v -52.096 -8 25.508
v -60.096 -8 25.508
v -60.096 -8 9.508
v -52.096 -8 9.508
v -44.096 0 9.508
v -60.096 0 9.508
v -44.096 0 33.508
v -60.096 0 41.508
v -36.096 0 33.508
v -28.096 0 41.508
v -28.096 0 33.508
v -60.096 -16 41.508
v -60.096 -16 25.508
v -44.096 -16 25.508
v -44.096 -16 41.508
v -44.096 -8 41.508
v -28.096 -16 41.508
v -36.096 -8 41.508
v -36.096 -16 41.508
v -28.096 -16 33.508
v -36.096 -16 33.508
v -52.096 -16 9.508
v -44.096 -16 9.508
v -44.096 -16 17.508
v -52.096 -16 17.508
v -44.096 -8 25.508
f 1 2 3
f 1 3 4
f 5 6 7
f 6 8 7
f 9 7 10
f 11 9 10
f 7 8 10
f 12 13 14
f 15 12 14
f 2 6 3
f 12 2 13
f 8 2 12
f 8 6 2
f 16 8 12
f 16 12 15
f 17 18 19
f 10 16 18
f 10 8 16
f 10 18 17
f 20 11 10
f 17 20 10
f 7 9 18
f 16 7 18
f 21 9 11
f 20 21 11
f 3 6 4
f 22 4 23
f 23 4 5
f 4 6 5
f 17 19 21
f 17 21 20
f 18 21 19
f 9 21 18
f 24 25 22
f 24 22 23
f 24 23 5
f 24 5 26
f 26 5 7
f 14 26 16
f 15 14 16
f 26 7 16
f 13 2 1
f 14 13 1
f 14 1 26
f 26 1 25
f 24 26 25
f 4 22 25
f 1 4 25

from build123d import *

# Parameters (mm, degrees)
F0_W      = 8
F0_H      = 8
F1_DEPTH  = 8
F2_DEPTH  = 16
F4_DEPTH  = 8
F5_DEPTH  = 16
F0_W_2    = 16
F0_H_2    = 16
F6_DEPTH  = 8
F7_W      = 8
F7_H      = 16
F8_DEPTH  = 8
F10_DEPTH = 8


with BuildPart() as f1:
    # F0 (on Front) → F1 (new body)
    with BuildSketch(Plane.XZ):
        with Locations((-40.0961564034, 37.5077876064)):
            Rectangle(F0_W, F0_H)
    extrude(amount=F1_DEPTH)

    # F0 (on Front) → F2 (join)
    with BuildSketch(Plane.XZ):
        Polygon((-44.0961564034, 41.5077876064), (-60.0961564034, 41.5077876064), (-60.0961564034, 25.5077876064), (-44.0961564034, 25.5077876064), (-44.0961564034, 33.5077876064), align=None)
    extrude(amount=F2_DEPTH)

    # F3 (on face) → F4 (cut)
    with BuildSketch(Plane.YZ.offset(-36.0961564034)):
        Polygon((0, 33.5077876064), (-8, 41.5077876064), (-8, 33.5077876064), align=None)
    extrude(amount=-F4_DEPTH, mode=Mode.SUBTRACT)

    # F0 (on Front) → F5 (join)
    with BuildSketch(Plane.XZ):
        with Locations((-32.0961564034, 37.5077876064)):
            Rectangle(F0_W, F0_H)
    extrude(amount=F5_DEPTH)

    # F0 (on Front) → F6 (join)
    with BuildSketch(Plane.XZ):
        with Locations((-52.0961564034, 17.5077876064)):
            Rectangle(F0_W_2, F0_H_2)
    extrude(amount=F6_DEPTH)

    # F7 (on face) → F8 (join)
    with BuildSketch(Plane.XZ.offset(8)):
        with Locations((-48.0961564034, 17.5077876064)):
            Rectangle(F7_W, F7_H)
    extrude(amount=F8_DEPTH)

    # F9 (on face) → F10 (cut)
    with BuildSketch(Plane(origin=(-52.0961564034, 0, 0), x_dir=(0, -1, 0), z_dir=(-1, 0, 0))):
        Polygon((8, 25.5077876064), (16, 17.5077876064), (16, 25.5077876064), align=None)
    extrude(amount=-F10_DEPTH, mode=Mode.SUBTRACT)


solid = f1.part
